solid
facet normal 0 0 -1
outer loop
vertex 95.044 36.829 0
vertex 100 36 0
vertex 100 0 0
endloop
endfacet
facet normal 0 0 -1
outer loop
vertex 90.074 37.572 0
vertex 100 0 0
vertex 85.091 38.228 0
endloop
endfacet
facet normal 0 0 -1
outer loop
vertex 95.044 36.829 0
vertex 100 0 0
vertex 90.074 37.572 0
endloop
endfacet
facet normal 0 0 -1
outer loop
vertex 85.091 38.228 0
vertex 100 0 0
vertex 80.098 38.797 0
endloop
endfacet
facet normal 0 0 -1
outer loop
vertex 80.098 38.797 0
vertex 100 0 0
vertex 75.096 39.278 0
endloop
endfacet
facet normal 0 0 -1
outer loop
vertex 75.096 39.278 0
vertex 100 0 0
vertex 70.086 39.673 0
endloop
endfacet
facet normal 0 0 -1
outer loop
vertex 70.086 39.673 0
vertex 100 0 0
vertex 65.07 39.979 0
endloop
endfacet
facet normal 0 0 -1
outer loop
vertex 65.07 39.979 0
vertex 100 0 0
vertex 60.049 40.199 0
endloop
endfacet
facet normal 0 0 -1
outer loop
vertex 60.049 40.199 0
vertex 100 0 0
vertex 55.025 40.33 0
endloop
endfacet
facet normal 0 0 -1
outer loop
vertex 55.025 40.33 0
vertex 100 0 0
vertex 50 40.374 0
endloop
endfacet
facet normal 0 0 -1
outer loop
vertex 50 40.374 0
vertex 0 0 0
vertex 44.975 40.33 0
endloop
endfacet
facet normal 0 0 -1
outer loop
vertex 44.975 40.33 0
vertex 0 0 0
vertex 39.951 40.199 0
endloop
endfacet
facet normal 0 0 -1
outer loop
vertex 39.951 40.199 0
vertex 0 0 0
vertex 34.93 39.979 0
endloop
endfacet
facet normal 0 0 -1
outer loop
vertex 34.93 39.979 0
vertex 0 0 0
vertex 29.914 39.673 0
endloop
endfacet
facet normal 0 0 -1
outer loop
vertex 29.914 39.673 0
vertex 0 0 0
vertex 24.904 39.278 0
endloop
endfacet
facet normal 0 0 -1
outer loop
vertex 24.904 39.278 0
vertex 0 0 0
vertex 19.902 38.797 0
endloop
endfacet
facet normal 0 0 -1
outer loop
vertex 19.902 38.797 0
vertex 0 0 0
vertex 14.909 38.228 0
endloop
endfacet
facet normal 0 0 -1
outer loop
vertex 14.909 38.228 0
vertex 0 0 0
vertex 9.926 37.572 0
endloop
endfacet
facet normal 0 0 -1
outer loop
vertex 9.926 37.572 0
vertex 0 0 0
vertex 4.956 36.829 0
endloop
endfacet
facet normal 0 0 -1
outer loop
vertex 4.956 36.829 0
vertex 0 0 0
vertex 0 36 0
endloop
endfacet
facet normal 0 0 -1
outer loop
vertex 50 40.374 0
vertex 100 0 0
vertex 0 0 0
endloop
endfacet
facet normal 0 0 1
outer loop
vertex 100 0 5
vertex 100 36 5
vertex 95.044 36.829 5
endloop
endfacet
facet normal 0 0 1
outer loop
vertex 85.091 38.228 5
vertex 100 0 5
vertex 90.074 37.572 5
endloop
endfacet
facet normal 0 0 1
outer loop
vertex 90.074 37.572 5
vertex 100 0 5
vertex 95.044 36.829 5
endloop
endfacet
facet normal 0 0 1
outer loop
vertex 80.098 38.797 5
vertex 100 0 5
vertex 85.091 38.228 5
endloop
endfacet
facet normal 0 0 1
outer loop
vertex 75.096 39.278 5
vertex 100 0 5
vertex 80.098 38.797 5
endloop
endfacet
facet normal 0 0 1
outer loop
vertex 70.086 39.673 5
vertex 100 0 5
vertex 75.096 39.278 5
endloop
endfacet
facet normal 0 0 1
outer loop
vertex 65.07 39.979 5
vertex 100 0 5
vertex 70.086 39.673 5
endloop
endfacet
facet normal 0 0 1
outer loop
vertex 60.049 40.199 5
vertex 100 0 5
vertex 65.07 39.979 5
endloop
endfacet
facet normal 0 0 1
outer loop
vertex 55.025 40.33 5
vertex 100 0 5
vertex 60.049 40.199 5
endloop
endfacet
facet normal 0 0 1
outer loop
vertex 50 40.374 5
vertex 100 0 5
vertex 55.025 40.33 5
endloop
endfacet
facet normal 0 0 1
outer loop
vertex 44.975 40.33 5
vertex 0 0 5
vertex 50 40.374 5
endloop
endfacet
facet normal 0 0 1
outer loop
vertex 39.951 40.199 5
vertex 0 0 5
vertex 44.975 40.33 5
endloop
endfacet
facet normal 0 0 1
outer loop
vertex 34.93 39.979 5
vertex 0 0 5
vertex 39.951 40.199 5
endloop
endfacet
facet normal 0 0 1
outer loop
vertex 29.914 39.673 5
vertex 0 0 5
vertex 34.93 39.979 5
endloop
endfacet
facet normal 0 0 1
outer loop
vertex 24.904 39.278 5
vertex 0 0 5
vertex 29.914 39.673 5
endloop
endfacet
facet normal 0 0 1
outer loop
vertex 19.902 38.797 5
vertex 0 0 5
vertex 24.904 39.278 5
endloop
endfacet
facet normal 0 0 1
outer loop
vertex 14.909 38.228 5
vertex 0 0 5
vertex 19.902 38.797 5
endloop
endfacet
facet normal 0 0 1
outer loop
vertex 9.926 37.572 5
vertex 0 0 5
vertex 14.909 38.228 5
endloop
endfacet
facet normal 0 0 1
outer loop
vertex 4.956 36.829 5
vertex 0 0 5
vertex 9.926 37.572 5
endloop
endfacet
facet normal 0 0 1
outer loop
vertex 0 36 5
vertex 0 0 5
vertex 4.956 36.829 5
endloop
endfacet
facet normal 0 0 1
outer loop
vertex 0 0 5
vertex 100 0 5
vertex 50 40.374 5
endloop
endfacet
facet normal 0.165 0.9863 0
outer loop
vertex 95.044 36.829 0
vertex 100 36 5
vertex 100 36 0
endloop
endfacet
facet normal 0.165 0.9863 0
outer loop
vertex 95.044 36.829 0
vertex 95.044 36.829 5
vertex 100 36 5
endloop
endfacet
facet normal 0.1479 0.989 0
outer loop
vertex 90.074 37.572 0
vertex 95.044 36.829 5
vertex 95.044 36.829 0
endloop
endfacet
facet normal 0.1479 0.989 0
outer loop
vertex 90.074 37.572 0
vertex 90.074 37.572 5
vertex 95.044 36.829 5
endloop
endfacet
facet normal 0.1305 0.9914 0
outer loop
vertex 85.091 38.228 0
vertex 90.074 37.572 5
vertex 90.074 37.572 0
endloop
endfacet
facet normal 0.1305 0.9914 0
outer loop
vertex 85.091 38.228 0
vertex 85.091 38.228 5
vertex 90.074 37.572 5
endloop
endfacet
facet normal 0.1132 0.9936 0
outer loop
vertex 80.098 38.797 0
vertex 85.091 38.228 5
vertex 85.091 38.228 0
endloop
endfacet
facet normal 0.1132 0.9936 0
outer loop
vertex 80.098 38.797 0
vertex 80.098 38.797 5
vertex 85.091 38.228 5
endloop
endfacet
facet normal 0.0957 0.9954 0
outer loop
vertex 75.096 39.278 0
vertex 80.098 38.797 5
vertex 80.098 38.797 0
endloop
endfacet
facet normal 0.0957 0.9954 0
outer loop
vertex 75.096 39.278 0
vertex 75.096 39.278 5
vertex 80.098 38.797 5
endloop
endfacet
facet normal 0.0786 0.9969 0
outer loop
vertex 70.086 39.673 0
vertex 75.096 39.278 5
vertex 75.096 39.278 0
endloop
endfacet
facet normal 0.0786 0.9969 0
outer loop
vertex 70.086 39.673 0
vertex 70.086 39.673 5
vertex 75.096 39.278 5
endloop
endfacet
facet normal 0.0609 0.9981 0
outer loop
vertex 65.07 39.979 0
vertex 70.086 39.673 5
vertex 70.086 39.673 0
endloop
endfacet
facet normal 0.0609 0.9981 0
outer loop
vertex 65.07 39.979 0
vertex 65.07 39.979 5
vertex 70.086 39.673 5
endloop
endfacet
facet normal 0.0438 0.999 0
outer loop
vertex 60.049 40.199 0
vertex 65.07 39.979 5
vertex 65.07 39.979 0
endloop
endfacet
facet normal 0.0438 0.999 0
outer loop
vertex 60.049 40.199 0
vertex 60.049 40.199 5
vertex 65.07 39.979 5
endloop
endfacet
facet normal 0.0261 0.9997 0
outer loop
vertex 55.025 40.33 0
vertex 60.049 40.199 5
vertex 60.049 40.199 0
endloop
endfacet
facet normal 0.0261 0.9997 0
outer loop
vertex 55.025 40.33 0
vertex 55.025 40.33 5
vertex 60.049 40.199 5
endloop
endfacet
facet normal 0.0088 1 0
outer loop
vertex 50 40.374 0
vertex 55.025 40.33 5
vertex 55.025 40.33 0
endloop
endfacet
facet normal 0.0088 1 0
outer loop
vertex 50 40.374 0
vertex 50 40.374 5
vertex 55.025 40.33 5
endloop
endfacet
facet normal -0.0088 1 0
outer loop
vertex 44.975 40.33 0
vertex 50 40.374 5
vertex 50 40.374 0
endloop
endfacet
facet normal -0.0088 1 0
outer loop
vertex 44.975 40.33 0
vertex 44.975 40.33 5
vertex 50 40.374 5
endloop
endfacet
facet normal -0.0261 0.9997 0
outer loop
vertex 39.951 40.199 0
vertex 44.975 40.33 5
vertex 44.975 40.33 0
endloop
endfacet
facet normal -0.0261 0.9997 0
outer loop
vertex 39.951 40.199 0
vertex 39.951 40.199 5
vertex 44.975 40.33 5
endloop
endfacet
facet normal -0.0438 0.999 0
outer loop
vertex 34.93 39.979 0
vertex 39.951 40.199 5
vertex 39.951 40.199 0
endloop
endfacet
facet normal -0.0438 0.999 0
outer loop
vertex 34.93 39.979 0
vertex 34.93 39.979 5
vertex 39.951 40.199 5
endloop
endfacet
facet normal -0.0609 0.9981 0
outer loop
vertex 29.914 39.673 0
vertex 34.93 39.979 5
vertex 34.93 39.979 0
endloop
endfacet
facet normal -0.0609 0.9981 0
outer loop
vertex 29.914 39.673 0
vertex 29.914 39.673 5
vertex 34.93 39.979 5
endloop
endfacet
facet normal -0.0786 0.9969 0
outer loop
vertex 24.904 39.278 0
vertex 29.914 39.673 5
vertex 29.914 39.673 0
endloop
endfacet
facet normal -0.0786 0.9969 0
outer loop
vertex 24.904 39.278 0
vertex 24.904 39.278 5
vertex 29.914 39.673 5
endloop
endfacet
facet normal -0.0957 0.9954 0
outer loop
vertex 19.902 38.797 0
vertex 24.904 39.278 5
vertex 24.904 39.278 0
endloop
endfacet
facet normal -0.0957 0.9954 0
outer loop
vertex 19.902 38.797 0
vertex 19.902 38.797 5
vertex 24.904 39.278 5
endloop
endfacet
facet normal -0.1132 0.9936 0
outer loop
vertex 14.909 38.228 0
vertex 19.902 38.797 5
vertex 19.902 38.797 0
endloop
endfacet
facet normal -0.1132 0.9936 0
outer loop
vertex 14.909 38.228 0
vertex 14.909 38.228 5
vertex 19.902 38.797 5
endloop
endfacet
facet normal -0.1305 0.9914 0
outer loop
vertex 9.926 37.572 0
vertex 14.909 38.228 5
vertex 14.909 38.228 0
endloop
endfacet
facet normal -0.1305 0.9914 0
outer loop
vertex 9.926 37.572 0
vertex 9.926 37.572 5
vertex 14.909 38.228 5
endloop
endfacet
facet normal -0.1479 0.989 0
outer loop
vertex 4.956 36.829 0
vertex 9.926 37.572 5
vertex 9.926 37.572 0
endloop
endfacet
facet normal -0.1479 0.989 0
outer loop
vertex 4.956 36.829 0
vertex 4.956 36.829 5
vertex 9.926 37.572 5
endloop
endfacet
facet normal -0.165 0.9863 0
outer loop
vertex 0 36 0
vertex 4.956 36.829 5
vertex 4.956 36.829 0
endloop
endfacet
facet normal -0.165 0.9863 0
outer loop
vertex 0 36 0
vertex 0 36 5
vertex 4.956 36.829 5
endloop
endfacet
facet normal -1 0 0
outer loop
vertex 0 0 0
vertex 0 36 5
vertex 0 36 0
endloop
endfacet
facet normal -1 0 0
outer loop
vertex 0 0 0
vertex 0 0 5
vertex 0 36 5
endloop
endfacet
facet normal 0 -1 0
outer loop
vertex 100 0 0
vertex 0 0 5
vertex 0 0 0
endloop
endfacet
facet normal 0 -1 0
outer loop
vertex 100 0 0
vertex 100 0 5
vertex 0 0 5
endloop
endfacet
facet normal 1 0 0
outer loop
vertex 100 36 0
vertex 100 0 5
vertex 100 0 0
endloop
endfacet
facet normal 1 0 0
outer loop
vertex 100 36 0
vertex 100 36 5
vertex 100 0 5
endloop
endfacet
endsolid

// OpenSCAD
$fn = 32;

// ----------------------------------------------------------------------
// Arc profile plate: crown, 23 points
// ----------------------------------------------------------------------

// --- parameters (mm) ---
bar_l = 100;              // bar length, X
bar_w = 36;               // bar height at the ends, Y
arc_r = 287.94;           // radius of the crown arc
arc_angle = 20;           // crown arc angle, degrees
crown_rise = 4.37;        // rise of the crown over the ends
arc_step = 1;             // sampling step of the crown arc, degrees
plate_t = 5;              // plate thickness, Z

bbox_y = bar_w + crown_rise;  // full height with the crown

profile = [[100, 36], [95.044, 36.829], [90.074, 37.572], [85.091, 38.228], [80.098, 38.797], [75.096, 39.278], [70.086, 39.673], [65.07, 39.979], [60.049, 40.199], [55.025, 40.33], [50, 40.374], [44.975, 40.33], [39.951, 40.199], [34.93, 39.979], [29.914, 39.673], [24.904, 39.278], [19.902, 38.797], [14.909, 38.228], [9.926, 37.572], [4.956, 36.829], [0, 36], [0, 0], [100, 0]];  // primary outline, 23 points, counter clockwise

// --- the one profile operation ---
linear_extrude(height = plate_t) polygon(points = profile);
